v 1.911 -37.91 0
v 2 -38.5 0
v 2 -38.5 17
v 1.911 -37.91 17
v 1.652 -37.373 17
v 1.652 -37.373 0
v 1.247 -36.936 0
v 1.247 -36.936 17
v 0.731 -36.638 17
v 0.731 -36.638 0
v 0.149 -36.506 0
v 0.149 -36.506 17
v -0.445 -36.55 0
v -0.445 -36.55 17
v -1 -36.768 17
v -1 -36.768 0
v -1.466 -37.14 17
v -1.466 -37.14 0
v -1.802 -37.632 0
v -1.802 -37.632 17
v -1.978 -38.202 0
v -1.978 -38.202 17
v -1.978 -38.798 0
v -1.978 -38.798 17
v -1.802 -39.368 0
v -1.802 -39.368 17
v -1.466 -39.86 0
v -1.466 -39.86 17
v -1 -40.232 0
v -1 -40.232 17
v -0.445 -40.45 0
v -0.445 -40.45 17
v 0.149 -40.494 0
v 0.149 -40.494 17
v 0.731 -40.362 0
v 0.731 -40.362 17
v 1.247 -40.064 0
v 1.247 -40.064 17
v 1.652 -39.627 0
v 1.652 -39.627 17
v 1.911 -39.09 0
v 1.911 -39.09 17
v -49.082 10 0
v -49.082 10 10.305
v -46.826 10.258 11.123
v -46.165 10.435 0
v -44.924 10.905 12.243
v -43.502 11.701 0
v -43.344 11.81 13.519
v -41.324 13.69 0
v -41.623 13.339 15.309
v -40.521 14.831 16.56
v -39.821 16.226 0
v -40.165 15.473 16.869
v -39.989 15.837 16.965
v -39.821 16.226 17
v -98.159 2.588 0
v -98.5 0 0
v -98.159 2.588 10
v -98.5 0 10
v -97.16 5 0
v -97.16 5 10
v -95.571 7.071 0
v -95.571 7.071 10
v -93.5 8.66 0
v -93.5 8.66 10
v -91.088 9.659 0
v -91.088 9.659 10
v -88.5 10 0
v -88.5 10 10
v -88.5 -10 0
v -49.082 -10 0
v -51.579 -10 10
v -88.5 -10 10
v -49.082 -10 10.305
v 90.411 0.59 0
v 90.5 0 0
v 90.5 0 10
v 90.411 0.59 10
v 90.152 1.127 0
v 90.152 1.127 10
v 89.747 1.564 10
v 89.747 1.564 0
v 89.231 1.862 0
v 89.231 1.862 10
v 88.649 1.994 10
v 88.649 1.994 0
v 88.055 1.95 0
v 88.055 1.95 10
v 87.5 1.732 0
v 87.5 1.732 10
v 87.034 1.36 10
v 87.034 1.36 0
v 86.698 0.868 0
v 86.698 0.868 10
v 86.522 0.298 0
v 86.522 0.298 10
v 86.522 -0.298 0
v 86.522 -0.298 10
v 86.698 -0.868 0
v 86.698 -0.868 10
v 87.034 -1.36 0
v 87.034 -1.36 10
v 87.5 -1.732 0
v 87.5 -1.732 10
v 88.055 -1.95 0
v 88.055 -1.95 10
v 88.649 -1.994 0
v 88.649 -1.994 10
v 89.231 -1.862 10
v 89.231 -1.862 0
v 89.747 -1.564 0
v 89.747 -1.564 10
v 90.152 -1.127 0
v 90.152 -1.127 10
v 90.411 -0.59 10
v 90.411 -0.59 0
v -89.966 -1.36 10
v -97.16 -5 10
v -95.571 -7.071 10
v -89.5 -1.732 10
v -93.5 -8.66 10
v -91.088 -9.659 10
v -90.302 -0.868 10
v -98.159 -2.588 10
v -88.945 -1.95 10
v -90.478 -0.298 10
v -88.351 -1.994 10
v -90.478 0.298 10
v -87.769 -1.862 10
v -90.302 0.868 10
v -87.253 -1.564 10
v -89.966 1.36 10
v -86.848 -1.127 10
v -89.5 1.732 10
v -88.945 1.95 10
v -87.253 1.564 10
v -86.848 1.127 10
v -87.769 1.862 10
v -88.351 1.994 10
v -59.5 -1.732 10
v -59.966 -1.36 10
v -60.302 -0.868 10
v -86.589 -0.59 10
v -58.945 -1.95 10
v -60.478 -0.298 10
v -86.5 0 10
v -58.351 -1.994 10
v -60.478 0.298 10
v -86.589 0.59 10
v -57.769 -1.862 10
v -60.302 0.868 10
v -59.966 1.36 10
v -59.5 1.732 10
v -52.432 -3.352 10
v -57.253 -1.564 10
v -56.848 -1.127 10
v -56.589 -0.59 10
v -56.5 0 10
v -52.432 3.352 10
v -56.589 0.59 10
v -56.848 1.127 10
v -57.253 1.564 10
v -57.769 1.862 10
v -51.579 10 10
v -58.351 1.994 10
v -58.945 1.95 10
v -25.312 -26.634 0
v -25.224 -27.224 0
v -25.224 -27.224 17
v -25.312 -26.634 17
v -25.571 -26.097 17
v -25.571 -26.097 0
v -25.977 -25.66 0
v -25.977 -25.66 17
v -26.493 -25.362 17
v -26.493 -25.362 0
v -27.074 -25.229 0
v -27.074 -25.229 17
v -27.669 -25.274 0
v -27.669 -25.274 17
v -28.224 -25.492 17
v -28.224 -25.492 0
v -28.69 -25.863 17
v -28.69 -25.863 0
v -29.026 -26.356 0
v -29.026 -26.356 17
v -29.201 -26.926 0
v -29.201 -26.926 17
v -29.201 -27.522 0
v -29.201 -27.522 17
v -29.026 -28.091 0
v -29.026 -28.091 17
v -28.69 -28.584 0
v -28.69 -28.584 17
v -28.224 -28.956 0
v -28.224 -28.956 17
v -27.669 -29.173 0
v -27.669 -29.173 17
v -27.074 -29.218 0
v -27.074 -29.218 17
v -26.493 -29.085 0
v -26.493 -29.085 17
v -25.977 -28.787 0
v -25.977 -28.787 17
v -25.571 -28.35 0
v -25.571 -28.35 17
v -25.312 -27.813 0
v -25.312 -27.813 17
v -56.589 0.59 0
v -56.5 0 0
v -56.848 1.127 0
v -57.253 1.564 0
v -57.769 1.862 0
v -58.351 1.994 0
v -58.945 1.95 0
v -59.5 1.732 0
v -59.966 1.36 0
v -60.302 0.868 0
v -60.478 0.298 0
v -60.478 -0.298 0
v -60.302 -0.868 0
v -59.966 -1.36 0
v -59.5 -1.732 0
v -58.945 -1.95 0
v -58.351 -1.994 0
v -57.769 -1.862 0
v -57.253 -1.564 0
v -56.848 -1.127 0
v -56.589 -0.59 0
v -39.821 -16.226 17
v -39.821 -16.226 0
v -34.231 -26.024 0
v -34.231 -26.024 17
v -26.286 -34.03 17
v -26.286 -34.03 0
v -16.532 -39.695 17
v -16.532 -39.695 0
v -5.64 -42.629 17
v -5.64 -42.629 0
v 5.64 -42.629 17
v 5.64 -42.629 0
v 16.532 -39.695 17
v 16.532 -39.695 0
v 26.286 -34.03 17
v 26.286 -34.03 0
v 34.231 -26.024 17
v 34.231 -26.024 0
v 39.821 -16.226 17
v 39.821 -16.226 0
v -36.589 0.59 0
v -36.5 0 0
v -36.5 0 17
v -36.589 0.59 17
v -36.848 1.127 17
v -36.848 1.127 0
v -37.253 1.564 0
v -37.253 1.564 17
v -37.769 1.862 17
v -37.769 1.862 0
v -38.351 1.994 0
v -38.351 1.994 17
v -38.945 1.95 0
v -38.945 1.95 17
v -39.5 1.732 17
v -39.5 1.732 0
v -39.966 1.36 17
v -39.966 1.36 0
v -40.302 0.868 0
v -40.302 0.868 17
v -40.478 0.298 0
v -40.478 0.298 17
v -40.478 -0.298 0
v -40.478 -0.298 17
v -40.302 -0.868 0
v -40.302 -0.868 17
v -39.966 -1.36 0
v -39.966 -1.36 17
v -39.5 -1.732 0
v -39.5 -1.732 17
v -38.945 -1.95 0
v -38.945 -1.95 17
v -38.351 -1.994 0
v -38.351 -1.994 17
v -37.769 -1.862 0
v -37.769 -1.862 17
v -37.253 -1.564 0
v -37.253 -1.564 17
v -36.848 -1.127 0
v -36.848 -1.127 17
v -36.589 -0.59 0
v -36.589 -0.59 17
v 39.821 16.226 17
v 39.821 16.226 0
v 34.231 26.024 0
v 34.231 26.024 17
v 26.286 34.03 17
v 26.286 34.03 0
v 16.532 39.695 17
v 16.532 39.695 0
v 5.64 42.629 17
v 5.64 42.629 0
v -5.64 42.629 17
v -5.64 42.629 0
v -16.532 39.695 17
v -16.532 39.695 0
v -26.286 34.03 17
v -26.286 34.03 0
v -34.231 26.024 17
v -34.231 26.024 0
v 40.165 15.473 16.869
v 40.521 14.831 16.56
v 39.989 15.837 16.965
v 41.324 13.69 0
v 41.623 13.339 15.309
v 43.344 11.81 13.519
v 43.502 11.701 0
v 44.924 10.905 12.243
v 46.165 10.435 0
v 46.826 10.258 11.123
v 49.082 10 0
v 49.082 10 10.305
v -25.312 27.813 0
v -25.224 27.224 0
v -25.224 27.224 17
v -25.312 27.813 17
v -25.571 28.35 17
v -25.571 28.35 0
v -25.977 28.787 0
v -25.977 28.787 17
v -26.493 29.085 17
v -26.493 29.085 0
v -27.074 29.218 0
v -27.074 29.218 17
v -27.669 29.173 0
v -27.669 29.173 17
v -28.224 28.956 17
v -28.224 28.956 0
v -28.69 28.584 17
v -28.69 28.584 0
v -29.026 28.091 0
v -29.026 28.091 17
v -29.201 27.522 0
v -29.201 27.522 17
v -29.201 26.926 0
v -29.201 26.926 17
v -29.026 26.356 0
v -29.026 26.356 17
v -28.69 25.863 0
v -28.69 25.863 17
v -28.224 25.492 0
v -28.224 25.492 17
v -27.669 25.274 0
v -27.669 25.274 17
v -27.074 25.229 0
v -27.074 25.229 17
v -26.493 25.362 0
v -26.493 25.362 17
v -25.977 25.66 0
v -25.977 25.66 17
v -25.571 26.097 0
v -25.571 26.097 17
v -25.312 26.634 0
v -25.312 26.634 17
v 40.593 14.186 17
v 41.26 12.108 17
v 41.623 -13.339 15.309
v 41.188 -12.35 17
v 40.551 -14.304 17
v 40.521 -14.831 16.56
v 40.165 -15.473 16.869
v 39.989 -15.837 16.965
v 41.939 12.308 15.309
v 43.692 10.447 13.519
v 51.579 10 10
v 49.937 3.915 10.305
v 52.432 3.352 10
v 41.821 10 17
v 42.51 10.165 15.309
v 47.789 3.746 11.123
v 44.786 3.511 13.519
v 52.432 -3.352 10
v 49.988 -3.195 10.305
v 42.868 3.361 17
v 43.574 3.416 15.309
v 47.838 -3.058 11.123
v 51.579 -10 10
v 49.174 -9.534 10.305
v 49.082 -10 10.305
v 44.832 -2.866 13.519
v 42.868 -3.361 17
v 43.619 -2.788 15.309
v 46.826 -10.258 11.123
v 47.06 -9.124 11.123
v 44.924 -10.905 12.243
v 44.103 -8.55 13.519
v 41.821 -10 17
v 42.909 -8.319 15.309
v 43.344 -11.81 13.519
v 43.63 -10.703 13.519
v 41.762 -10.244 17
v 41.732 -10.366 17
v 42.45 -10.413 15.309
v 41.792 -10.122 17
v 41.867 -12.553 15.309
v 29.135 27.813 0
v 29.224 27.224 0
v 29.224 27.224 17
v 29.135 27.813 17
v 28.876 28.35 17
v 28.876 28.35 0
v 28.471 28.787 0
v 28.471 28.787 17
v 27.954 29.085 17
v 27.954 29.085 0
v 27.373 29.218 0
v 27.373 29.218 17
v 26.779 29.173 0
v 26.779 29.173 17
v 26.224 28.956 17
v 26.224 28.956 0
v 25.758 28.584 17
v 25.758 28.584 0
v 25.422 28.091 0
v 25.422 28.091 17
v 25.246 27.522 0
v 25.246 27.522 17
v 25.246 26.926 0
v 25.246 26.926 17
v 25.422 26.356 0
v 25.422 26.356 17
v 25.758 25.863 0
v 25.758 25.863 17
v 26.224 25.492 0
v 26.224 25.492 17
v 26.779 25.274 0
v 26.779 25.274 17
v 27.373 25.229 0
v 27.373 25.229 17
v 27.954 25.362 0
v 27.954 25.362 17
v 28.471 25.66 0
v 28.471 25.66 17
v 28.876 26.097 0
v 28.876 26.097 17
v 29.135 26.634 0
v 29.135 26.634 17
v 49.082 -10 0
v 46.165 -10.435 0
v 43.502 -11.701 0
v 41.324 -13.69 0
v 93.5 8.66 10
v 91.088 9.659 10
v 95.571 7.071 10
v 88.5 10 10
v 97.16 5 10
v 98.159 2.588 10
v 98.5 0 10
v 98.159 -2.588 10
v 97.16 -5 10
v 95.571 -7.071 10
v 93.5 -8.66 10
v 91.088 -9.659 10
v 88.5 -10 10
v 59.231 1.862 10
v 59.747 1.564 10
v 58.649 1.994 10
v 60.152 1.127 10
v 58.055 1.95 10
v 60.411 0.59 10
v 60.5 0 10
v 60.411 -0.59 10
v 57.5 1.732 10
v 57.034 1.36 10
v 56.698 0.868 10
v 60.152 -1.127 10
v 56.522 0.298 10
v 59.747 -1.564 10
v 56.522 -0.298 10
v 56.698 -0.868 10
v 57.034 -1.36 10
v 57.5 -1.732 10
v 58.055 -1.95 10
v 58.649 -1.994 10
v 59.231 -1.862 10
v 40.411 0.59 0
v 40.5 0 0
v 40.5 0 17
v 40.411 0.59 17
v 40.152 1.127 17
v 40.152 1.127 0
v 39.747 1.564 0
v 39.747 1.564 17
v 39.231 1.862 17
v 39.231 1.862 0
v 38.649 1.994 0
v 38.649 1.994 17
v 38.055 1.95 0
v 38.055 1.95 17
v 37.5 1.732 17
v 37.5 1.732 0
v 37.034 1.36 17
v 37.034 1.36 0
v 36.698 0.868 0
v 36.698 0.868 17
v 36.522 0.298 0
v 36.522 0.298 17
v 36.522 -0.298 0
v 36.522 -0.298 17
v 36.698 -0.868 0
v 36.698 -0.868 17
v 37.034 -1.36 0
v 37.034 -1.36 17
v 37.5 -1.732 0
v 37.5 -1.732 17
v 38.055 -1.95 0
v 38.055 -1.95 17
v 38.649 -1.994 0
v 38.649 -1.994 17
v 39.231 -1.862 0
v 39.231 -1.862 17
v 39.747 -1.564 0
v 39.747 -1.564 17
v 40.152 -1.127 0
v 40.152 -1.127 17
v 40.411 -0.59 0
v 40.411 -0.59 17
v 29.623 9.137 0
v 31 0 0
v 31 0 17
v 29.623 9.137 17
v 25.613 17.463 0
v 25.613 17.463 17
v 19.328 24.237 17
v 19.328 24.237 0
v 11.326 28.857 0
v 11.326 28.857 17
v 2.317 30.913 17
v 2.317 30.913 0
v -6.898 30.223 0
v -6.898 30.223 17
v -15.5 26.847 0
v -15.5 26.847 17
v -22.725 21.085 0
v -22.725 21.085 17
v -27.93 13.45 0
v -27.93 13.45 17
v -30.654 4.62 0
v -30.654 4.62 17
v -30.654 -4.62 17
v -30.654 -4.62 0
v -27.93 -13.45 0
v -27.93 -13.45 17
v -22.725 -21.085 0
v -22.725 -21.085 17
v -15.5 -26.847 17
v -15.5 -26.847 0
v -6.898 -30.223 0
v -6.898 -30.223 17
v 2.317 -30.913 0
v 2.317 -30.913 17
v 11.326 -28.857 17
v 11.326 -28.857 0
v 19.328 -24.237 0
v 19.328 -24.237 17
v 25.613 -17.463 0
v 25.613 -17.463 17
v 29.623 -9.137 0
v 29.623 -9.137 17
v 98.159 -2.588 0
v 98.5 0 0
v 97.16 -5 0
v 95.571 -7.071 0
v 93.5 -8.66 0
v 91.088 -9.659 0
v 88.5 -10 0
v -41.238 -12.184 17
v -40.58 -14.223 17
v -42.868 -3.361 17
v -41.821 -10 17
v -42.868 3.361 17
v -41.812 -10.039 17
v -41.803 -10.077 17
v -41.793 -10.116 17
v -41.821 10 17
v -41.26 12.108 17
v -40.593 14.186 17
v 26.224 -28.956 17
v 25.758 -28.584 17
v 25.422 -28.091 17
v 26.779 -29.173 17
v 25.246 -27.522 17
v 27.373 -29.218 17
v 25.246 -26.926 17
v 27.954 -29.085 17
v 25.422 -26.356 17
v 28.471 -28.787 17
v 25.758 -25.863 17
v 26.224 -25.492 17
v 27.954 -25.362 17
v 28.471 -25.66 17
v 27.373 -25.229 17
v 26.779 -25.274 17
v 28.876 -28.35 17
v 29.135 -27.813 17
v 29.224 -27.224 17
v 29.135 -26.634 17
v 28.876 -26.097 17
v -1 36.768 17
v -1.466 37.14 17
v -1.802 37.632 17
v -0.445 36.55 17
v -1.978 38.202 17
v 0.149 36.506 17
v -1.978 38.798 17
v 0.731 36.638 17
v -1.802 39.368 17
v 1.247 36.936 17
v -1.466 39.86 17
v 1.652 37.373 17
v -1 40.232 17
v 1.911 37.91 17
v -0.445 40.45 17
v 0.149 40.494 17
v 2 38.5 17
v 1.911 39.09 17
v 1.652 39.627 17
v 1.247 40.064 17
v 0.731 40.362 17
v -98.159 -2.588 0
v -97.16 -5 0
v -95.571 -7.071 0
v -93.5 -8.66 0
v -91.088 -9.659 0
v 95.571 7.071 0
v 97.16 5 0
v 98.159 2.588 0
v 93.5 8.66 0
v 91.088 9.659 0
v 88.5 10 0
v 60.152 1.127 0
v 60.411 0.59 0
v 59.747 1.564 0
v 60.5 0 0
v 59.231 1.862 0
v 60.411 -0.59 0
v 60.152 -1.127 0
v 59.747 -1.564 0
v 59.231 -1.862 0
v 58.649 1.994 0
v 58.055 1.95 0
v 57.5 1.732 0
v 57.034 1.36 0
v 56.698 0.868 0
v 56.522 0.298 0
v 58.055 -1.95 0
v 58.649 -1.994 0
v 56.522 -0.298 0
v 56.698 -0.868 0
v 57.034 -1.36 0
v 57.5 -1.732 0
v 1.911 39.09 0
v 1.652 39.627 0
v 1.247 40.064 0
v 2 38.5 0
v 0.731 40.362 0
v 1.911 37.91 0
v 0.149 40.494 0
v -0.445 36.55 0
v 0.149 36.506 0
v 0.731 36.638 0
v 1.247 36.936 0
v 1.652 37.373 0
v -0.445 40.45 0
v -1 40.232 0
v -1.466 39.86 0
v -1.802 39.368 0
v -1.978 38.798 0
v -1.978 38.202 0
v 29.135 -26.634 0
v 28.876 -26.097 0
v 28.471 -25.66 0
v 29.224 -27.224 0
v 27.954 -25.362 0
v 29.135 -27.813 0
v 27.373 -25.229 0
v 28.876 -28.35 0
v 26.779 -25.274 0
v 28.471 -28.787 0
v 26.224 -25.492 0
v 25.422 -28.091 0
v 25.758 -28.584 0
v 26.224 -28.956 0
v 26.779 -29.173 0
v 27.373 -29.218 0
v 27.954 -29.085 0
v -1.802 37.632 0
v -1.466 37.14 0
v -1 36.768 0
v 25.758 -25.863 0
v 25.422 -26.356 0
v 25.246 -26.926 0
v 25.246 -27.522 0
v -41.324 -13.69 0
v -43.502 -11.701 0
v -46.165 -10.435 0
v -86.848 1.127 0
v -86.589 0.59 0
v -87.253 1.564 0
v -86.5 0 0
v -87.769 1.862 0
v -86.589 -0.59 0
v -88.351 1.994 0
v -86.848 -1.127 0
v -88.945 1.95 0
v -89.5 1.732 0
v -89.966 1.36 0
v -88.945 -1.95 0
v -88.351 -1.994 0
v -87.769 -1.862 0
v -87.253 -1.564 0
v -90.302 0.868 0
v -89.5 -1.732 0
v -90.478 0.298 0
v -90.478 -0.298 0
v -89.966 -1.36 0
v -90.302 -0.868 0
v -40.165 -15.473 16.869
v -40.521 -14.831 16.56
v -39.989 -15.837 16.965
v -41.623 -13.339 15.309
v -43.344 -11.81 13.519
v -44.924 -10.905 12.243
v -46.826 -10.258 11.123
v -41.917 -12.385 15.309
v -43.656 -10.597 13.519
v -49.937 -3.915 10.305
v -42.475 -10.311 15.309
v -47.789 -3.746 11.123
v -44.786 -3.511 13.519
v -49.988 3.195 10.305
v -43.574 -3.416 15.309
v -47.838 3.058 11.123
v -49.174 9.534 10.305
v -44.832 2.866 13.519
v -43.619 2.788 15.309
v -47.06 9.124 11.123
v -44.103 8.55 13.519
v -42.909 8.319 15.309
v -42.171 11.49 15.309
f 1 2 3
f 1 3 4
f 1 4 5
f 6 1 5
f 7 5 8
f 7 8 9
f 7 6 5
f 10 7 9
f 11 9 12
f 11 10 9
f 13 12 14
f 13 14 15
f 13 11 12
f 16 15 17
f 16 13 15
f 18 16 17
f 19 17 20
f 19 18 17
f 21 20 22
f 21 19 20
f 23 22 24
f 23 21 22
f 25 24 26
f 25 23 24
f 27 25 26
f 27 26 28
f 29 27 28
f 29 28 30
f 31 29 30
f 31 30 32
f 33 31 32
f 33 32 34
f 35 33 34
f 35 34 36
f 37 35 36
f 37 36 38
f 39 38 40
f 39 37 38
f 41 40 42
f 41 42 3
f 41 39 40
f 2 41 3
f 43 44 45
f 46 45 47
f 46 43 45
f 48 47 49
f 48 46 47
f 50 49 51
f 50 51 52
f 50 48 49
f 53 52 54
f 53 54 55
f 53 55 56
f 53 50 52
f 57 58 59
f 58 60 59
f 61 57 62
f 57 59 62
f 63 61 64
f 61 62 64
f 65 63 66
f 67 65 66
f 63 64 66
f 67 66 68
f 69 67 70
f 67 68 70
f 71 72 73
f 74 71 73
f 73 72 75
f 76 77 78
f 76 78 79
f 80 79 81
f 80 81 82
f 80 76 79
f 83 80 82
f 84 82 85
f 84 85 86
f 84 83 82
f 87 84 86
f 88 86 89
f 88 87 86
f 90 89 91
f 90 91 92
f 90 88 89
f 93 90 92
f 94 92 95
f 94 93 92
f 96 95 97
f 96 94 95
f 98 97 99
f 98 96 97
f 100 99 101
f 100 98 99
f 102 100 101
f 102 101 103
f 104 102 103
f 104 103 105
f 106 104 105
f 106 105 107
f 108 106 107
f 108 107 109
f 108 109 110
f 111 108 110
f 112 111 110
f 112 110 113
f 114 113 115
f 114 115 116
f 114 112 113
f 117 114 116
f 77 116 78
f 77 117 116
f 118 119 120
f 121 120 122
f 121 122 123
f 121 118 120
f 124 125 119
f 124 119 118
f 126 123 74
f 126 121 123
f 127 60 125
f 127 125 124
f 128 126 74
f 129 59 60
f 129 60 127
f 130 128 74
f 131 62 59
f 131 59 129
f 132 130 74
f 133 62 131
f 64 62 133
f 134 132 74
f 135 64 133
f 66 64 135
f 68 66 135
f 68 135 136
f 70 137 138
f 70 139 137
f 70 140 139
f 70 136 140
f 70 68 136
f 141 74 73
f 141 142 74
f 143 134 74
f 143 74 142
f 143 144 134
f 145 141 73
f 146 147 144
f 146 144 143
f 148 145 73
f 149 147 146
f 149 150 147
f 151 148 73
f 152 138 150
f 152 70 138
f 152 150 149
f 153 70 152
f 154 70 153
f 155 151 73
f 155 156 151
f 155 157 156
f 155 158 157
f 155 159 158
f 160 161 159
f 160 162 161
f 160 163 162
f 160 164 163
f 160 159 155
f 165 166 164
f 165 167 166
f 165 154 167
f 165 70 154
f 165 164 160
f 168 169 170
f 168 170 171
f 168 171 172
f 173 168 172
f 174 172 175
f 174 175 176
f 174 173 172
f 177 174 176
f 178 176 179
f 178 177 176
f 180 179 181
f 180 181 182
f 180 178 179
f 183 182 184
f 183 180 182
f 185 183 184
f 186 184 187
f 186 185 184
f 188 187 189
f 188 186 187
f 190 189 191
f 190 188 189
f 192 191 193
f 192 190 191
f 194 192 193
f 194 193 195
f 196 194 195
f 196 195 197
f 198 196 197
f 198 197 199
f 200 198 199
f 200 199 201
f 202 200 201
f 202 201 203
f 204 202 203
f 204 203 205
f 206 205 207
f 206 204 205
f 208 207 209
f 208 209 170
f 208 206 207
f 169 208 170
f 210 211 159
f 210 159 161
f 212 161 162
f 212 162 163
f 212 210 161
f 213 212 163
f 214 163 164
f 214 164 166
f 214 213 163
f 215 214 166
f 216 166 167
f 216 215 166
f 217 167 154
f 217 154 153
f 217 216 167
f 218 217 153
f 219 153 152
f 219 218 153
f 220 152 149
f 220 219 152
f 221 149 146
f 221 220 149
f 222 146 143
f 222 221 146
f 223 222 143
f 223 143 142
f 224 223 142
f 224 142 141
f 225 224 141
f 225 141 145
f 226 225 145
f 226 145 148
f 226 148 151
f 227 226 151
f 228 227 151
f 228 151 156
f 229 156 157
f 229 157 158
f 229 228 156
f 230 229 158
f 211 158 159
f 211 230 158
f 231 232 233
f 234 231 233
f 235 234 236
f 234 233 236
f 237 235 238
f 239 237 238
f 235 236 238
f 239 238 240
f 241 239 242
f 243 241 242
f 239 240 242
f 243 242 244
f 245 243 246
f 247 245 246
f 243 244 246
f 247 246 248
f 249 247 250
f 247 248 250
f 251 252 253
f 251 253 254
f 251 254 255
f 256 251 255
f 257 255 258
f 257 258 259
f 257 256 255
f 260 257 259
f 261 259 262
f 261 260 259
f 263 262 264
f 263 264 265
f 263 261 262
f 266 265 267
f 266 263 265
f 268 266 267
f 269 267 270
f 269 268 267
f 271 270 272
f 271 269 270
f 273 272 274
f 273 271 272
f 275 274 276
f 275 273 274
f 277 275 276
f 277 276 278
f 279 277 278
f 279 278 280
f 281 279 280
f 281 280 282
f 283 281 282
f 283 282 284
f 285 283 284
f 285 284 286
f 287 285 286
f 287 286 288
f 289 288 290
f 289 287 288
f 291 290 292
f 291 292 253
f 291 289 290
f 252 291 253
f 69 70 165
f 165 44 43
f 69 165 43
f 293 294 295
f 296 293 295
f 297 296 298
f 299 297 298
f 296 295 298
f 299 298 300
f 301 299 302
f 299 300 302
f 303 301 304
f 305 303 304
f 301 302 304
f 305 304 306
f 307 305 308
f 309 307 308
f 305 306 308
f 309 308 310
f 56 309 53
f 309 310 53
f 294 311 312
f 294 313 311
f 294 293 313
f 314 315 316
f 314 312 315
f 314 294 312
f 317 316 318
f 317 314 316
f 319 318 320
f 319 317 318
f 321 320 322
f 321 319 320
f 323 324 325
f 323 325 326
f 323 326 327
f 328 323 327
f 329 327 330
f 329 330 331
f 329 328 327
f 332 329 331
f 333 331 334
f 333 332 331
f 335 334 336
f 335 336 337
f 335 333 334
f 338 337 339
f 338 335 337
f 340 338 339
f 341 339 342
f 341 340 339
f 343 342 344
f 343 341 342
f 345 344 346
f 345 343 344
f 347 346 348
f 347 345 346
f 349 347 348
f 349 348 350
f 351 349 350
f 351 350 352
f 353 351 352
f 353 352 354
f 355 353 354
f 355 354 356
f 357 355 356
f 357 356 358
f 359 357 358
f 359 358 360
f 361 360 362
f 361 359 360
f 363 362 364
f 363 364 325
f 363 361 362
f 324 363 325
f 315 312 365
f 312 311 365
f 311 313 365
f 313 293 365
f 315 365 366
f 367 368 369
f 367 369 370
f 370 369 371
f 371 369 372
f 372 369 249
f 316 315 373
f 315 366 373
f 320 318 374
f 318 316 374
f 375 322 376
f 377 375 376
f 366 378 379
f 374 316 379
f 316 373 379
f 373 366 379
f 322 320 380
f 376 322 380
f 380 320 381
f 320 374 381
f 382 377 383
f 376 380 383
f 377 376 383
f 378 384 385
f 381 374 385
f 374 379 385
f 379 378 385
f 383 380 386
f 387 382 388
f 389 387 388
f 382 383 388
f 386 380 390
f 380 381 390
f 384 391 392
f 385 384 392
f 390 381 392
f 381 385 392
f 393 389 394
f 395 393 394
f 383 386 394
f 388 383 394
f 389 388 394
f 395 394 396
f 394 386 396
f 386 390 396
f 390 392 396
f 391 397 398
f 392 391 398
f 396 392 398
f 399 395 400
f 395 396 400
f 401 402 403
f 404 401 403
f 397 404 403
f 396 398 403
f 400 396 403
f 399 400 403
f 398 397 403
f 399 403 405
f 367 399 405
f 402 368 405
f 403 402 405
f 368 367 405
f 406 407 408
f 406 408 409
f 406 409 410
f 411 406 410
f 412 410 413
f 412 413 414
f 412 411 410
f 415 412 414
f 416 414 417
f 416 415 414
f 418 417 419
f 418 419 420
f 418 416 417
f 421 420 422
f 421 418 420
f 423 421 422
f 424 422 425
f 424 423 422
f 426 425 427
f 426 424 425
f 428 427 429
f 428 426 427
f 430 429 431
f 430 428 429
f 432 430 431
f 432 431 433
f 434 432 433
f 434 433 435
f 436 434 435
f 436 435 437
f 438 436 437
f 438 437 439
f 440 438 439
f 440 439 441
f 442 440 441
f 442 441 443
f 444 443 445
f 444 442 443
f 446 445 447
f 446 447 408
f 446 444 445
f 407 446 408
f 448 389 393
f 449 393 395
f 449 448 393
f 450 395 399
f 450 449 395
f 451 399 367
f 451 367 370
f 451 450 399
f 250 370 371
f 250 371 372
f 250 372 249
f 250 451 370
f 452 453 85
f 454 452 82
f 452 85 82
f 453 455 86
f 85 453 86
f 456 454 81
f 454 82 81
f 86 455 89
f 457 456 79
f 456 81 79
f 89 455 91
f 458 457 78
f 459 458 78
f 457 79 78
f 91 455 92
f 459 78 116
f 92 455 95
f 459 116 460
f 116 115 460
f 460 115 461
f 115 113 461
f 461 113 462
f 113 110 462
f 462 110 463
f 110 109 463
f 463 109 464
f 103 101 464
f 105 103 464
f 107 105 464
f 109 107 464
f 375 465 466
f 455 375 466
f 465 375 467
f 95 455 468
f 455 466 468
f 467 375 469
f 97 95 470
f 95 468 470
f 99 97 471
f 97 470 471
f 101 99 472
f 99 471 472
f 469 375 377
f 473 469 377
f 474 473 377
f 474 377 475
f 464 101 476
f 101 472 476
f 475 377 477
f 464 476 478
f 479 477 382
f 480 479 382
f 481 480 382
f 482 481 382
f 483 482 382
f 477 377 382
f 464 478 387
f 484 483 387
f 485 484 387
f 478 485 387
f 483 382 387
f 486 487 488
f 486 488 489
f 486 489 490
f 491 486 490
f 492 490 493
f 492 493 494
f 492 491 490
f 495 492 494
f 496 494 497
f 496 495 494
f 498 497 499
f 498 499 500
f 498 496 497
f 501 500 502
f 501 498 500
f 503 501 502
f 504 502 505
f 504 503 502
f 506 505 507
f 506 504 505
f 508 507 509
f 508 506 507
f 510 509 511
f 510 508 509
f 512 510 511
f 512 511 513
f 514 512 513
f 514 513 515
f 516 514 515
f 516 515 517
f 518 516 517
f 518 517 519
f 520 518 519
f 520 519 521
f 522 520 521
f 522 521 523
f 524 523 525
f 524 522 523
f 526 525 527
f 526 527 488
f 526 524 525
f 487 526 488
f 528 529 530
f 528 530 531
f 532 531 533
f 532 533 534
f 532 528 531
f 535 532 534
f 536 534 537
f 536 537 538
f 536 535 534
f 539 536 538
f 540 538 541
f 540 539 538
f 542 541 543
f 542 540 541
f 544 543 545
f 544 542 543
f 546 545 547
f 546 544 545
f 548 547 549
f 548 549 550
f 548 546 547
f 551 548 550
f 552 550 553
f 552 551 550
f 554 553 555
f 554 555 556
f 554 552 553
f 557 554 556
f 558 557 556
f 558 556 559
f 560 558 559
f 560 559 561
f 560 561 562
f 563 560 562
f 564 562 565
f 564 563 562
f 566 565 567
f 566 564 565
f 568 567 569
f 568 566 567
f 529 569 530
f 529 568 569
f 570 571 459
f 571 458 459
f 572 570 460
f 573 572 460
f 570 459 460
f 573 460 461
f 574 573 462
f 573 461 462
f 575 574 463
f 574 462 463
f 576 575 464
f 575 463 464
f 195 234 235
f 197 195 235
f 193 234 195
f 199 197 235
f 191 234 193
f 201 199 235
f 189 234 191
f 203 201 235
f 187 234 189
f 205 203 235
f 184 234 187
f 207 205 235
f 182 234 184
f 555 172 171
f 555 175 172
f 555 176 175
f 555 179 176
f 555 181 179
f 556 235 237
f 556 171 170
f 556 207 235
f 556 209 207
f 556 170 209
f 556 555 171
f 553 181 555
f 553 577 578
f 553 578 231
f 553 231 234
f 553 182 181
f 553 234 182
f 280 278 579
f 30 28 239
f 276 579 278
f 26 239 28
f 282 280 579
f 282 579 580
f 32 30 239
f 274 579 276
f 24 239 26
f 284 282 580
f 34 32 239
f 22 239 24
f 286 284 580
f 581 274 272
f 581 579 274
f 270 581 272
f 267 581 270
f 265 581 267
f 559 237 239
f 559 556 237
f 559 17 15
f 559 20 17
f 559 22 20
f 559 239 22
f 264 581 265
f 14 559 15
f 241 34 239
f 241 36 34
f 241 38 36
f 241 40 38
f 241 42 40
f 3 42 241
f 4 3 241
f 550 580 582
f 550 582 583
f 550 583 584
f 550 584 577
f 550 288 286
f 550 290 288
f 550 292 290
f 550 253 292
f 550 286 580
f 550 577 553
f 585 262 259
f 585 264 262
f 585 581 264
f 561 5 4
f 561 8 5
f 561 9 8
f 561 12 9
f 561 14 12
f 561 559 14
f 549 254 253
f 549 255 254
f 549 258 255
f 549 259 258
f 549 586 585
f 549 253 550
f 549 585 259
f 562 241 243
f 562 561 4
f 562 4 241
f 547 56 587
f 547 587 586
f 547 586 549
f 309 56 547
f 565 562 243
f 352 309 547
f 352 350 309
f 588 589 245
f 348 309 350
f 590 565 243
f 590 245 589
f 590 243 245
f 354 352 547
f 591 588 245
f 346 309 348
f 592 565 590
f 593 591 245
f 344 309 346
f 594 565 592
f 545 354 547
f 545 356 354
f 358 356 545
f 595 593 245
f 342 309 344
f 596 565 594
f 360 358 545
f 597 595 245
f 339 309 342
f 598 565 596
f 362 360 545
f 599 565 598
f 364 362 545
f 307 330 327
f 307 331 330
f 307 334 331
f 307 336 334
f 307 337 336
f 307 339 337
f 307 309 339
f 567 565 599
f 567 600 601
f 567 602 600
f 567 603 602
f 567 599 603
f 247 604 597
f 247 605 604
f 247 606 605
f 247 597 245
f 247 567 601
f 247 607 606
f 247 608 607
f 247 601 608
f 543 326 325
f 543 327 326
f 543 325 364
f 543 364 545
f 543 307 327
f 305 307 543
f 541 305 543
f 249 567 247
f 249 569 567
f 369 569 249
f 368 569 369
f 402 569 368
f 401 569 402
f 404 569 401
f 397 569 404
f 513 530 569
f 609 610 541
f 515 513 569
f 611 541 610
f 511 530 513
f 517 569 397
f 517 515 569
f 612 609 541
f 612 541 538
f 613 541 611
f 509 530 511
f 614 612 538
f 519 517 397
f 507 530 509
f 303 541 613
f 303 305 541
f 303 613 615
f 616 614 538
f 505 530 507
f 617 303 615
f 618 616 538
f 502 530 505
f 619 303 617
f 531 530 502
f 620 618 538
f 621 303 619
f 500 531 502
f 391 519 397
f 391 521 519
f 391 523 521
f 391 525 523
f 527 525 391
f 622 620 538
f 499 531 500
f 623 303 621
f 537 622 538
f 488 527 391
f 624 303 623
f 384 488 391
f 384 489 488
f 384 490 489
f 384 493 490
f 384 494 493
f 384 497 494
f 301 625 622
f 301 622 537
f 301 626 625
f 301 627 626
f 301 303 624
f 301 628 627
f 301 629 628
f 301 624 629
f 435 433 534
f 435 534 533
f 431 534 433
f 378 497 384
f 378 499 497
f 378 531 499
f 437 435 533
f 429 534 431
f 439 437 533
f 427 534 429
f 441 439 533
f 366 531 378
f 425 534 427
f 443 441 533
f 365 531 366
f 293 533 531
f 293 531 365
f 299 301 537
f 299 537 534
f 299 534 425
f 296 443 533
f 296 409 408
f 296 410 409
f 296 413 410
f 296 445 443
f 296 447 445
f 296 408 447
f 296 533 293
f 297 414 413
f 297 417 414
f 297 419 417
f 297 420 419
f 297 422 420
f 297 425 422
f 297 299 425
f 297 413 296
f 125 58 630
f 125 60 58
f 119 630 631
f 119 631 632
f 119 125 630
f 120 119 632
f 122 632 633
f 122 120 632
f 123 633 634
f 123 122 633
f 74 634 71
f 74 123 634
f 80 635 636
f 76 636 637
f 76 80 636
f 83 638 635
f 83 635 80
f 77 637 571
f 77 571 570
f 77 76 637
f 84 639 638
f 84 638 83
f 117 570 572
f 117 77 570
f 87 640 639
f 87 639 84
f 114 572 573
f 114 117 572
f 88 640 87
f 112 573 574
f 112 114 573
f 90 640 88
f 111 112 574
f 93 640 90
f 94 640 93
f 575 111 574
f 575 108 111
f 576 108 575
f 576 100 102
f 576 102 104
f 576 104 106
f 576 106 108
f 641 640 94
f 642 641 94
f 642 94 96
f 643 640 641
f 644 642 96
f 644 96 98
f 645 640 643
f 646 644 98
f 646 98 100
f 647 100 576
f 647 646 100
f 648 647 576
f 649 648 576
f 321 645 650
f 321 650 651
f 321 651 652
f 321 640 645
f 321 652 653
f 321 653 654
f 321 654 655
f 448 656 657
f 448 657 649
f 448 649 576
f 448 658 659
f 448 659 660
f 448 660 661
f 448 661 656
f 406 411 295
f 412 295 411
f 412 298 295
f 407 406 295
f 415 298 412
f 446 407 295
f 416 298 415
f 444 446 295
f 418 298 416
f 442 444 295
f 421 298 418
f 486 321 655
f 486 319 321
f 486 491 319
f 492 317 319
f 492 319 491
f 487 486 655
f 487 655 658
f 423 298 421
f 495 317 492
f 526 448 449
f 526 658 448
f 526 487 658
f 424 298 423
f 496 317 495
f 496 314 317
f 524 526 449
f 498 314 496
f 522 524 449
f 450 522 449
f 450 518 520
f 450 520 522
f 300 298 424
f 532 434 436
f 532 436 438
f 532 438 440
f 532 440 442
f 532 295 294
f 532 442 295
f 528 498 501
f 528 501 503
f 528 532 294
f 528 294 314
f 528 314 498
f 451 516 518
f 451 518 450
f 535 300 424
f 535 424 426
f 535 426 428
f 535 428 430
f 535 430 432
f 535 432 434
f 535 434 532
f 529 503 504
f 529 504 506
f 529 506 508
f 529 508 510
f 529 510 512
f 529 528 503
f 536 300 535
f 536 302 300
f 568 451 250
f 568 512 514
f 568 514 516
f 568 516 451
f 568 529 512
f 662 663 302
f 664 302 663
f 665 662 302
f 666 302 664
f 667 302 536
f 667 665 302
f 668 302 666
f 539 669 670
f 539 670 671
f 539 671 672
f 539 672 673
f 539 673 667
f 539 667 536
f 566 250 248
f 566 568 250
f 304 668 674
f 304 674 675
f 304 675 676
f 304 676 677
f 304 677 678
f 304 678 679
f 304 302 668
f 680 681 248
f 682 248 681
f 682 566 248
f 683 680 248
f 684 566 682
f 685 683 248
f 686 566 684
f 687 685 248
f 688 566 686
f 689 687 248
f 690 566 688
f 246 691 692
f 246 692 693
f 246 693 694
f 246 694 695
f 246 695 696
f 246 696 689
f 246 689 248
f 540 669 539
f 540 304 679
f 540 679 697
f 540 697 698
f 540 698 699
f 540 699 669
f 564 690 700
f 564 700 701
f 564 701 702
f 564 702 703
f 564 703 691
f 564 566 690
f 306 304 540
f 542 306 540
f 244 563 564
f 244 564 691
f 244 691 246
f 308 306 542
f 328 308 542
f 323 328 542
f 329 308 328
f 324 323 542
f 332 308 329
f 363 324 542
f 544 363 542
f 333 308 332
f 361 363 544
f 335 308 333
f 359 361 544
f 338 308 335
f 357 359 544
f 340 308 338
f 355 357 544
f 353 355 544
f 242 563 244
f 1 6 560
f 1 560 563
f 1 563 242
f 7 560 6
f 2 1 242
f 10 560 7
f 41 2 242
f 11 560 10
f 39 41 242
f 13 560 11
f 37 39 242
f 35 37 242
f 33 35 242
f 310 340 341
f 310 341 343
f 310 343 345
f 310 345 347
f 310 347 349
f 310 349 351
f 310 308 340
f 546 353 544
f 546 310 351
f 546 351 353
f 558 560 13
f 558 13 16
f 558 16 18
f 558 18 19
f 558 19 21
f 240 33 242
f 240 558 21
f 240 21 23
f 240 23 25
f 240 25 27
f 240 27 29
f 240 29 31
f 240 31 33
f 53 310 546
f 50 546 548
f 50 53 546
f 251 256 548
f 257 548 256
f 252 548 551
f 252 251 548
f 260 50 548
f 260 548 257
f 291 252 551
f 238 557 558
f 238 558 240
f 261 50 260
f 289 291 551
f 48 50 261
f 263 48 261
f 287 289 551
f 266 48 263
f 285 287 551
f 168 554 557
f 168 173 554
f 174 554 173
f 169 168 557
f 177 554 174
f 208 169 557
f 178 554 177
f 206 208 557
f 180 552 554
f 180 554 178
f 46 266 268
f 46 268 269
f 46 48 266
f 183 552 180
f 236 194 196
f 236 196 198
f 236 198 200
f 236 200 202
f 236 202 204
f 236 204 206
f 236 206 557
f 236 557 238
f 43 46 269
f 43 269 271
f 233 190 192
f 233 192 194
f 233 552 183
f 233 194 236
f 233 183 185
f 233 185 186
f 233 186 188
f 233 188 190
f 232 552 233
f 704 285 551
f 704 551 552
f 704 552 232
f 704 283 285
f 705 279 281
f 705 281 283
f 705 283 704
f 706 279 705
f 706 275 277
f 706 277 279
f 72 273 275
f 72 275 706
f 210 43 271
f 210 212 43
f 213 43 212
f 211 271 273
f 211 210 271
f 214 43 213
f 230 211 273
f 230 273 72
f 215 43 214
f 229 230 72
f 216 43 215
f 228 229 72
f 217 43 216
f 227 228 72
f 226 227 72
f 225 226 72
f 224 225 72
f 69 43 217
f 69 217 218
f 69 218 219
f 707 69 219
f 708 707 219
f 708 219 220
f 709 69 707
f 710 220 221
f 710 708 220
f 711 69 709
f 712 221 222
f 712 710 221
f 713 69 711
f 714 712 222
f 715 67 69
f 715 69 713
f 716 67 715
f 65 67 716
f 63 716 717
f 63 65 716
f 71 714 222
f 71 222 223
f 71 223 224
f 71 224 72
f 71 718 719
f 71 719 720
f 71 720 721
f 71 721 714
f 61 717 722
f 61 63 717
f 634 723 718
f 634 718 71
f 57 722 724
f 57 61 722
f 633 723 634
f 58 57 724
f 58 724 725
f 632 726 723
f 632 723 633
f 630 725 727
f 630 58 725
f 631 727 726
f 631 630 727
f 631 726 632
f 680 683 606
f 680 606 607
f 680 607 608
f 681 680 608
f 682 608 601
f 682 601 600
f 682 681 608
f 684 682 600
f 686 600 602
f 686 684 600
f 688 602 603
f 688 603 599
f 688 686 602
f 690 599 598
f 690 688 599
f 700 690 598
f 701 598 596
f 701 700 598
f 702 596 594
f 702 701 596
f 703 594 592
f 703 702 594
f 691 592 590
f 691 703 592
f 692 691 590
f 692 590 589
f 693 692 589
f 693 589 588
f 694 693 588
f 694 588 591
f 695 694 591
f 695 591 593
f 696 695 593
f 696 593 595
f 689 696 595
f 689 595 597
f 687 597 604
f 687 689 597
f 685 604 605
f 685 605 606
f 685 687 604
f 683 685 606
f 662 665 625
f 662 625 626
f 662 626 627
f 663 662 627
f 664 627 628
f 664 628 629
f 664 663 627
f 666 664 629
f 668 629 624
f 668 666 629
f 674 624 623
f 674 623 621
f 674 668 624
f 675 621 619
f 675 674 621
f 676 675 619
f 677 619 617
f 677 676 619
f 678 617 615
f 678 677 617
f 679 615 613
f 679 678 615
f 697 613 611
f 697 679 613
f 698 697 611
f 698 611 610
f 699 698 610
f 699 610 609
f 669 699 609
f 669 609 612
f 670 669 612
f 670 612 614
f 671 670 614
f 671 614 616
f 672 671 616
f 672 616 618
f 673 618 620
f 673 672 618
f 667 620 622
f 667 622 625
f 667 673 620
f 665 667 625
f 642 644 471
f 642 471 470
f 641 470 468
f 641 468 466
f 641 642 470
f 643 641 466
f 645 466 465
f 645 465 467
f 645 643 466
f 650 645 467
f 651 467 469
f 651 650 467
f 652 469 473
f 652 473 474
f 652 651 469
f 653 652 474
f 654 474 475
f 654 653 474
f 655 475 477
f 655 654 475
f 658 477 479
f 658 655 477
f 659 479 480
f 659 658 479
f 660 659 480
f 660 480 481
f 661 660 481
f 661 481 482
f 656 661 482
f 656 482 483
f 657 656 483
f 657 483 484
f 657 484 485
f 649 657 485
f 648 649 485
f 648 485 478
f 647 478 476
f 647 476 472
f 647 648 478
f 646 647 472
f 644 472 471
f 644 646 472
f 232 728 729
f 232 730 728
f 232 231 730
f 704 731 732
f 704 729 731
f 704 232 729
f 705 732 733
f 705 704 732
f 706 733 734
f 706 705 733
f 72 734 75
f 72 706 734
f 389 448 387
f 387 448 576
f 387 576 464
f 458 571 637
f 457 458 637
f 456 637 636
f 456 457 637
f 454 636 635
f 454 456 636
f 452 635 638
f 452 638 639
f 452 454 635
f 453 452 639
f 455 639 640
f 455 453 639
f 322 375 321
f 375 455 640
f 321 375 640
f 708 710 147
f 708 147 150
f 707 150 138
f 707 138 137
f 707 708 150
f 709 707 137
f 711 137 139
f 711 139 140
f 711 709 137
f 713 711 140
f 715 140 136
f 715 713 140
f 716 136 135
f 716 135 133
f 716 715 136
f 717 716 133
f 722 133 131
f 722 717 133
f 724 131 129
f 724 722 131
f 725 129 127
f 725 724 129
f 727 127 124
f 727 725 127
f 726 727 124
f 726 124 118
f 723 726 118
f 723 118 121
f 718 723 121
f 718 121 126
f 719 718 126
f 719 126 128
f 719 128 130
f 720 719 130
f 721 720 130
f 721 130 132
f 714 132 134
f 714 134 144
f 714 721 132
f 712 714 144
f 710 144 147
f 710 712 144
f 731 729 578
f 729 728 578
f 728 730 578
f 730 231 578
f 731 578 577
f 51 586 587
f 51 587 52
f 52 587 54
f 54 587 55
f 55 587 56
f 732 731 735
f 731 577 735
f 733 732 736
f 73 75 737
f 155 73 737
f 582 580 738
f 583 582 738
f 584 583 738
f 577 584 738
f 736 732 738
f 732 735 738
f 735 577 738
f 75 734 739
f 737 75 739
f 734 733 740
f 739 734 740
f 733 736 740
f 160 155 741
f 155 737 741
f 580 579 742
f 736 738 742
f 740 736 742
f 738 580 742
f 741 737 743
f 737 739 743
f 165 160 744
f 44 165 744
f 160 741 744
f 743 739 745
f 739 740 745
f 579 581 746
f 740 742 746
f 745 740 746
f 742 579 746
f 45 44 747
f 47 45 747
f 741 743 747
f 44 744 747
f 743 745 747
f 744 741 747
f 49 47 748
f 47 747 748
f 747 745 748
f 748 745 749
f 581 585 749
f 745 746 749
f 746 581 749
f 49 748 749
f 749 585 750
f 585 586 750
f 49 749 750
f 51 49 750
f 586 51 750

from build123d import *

# Parameters (mm, degrees)
SKETCH1_R           = 2
SKETCH1_R_2         = 31
BOSS_EXTRUDE1_DEPTH = 17
SKETCH1_3_R         = 2
BOSS_EXTRUDE2_DEPTH = 10
FILLET1_R           = 10
FILLET2_R           = 10


# Some blends are built 0.0001 mm under size
with BuildPart() as part:
    # Sketch1 → Boss-Extrude1 (new body)
    with BuildSketch(Plane.XY):
        with BuildLine():
            ThreePointArc((41.821047333, 10), (0, 43), (-41.821047333, 10))
            ThreePointArc((-41.821047333, 10), (-43, 0), (-41.821047333, -10))
            ThreePointArc((-41.821047333, -10), (-41.80718648, -10.057790941), (-41.793245769, -10.11556267))
            ThreePointArc((-41.793245769, -10.11556267), (-0.129174326, -42.999805976), (41.731716335, -10.366477306))
            ThreePointArc((41.731716335, -10.366477306), (41.776783691, -10.183336608), (41.821047333, -10))
            ThreePointArc((41.821047333, -10), (43, 0), (41.821047333, 10))
        make_face()
        with Locations((-27.223611076, -27.223611076)):
            Circle(SKETCH1_R, mode=Mode.SUBTRACT)
        with Locations((0, -38.5)):
            Circle(SKETCH1_R, mode=Mode.SUBTRACT)
        with Locations((27.223611076, -27.223611076)):
            Circle(SKETCH1_R, mode=Mode.SUBTRACT)
        with Locations((-38.5, 0)):
            Circle(SKETCH1_R, mode=Mode.SUBTRACT)
        with Locations((-27.223611076, 27.223611076)):
            Circle(SKETCH1_R, mode=Mode.SUBTRACT)
        Circle(SKETCH1_R_2, mode=Mode.SUBTRACT)
        with Locations((38.5, 0)):
            Circle(SKETCH1_R, mode=Mode.SUBTRACT)
        with Locations((27.223611076, 27.223611076)):
            Circle(SKETCH1_R, mode=Mode.SUBTRACT)
        with Locations((0, 38.5)):
            Circle(SKETCH1_R, mode=Mode.SUBTRACT)
    extrude(amount=BOSS_EXTRUDE1_DEPTH)

    # Sketch1<3> → Boss-Extrude2 (add)
    # profile 1 of 2: a face of its own
    with BuildSketch(Plane.XY):
        with BuildLine():
            ThreePointArc((-41.821047333, -10), (-43, 0), (-41.821047333, 10))
            Line((-41.821047333, 10), (-98.5, 10))
            Line((-98.5, 10), (-98.5, -10))
            Line((-98.5, -10), (-41.821047333, -10))
        make_face()
        with Locations((-88.5, 0)):
            Circle(SKETCH1_3_R, mode=Mode.SUBTRACT)
        with Locations((-58.5, 0)):
            Circle(SKETCH1_3_R, mode=Mode.SUBTRACT)
    # profile 2 of 2: a face of its own
    with BuildSketch(Plane.XY):
        with BuildLine():
            Line((98.5, 10), (41.821047333, 10))
            ThreePointArc((41.821047333, 10), (43, 0), (41.821047333, -10))
            Line((41.821047333, -10), (98.5, -10))
            Line((98.5, -10), (98.5, 10))
        make_face()
        with Locations((58.5, 0)):
            Circle(SKETCH1_3_R, mode=Mode.SUBTRACT)
        with Locations((88.5, 0)):
            Circle(SKETCH1_3_R, mode=Mode.SUBTRACT)
    extrude(amount=BOSS_EXTRUDE2_DEPTH)

    # Fillet1
    # the kernel refuses this fillet: 10 mm, written as the material it adds along each edge
    with BuildSketch(Plane(origin=(0, 0, 10), x_dir=(-0.7043119936118605, -0.7098905659709015, 0), z_dir=(0.7098905659709015, -0.7043119936118605, 0))) as fillet1_piece_1_section:
        with BuildLine():
            CenterArc((52.539392014, -10), FILLET1_R, 90, 72.542396876)
            Line((52.539392014, 0), (52.539392014, 0.2))
            Line((52.539392014, 0.2), (43, 0.2))
            Line((43, 0.2), (42.8, 0))
            ThreePointArc((42.8, 0), (42.8, -3.5), (42.80921216, -6.94))
            Line((42.80921216, -6.94), (43, -7))
        make_face()
    fillet1_piece_1 = revolve(axis=Axis((0, 0, 10), (0, 0, -1)), revolution_arc=90.452024347, mode=Mode.PRIVATE)
    fillet1_piece_1 = split(fillet1_piece_1, bisect_by=Plane(origin=(-44.895509483, 10, 11.788543671), z_dir=(0, -1, 0)), keep=Keep.TOP, mode=Mode.PRIVATE)
    fillet1_piece_1 = split(fillet1_piece_1, bisect_by=Plane(origin=(-44.895509483, -10, 11.788543671), z_dir=(0, 1, 0)), keep=Keep.TOP, mode=Mode.PRIVATE)
    add(fillet1_piece_1)
    with BuildSketch(Plane(origin=(-41.821047333, -10, 0), x_dir=(0.30584389927154154, -0.952081671537888, 0), z_dir=(0, 0, 1)), Plane(origin=(41.821047333, 10, 0), x_dir=(-0.30584389927146016, 0.9520816715379143, 0), z_dir=(0, 0, 1))) as fillet1_piece_2:
        with BuildLine():
            CenterArc((7.300231752, -9.971044568), FILLET1_R, 94.36121506, 67.829842836)
            Line((-2.220584963, -6.912605575), (-2.411001297, -6.851436795))
            Line((-2.411001297, -6.851436795), (-0.190416334, 0.06116878))
            Line((-0.190416334, 0.06116878), (0.015208816, 0.199420891))
            ThreePointArc((0.015208816, 0.199420891), (3.269895472, 0.075491643), (6.524582129, 0.199420891))
            Line((6.524582129, 0.199420891), (6.539790945, 0))
        make_face()
    extrude(amount=10)
    with BuildSketch(Plane(origin=(-41.821047333, 10, 0), x_dir=(0.3058438992715413, 0.9520816715378883, 0), z_dir=(0, 0, 1)), Plane(origin=(41.821047333, -10, 0), x_dir=(-0.30584389927145916, -0.9520816715379147, 0), z_dir=(0, 0, 1))) as fillet1_piece_3:
        with BuildLine():
            CenterArc((7.300231752, 9.971044568), FILLET1_R, 197.808942104, 67.829842836)
            Line((-2.220584963, 6.912605575), (-2.411001297, 6.851436795))
            Line((-2.411001297, 6.851436795), (-0.190416334, -0.06116878))
            Line((-0.190416334, -0.06116878), (0.015208816, -0.199420891))
            ThreePointArc((0.015208816, -0.199420891), (3.269895472, -0.075491643), (6.524582129, -0.199420891))
            Line((6.524582129, -0.199420891), (6.539790945, 0))
        make_face()
    extrude(amount=10)
    with BuildSketch(Plane(origin=(0, 0, 10), x_dir=(0.7043119936118566, 0.709890565970905, 0), z_dir=(-0.709890565970905, 0.7043119936118566, 0))) as fillet1_piece_4_section:
        with BuildLine():
            CenterArc((52.539392014, -10), FILLET1_R, 90, 72.542396876)
            Line((52.539392014, 0), (52.539392014, 0.2))
            Line((52.539392014, 0.2), (43, 0.2))
            Line((43, 0.2), (42.8, 0))
            ThreePointArc((42.8, 0), (42.8, -3.5), (42.80921216, -6.94))
            Line((42.80921216, -6.94), (43, -7))
        make_face()
    fillet1_piece_4 = revolve(axis=Axis((0, 0, 10), (0, 0, -1)), revolution_arc=90.452024347, mode=Mode.PRIVATE)
    fillet1_piece_4 = split(fillet1_piece_4, bisect_by=Plane(origin=(44.895509483, -10, 11.788543671), z_dir=(0, 1, 0)), keep=Keep.TOP, mode=Mode.PRIVATE)
    fillet1_piece_4 = split(fillet1_piece_4, bisect_by=Plane(origin=(44.895509483, 10, 11.788543671), z_dir=(0, -1, 0)), keep=Keep.TOP, mode=Mode.PRIVATE)
    add(fillet1_piece_4)
    with BuildSketch(Plane(origin=(0, 0, 10), x_dir=(-0.7043119936118605, -0.7098905659709015, 0), z_dir=(0.7098905659709015, -0.7043119936118605, 0))) as fillet1_piece_5a_section:
        with BuildLine():
            CenterArc((52.539392014, -10), FILLET1_R, 90, 72.542396876)
            Line((52.539392014, 0), (52.539392014, 0.2))
            Line((52.539392014, 0.2), (43, 0.2))
            Line((43, 0.2), (42.8, 0))
            ThreePointArc((42.8, 0), (42.8, -3.5), (42.80921216, -6.94))
            Line((42.80921216, -6.94), (43, -7))
        make_face()
    fillet1_piece_5a = revolve(axis=Axis((0, 0, 10), (0, 0, -1)), revolution_arc=90.452024347, mode=Mode.PRIVATE)
    fillet1_piece_5a = split(fillet1_piece_5a, bisect_by=Plane(origin=(-39.191113565, -10, 11.725292832), z_dir=(0, -1, 0)), keep=Keep.TOP, mode=Mode.PRIVATE)
    with BuildSketch(Plane(origin=(-41.821047333, -10, 0), x_dir=(0.30584389927154154, -0.952081671537888, 0), z_dir=(0, 0, 1))) as fillet1_piece_5b_section:
        with BuildLine():
            CenterArc((7.300231752, -9.971044568), FILLET1_R, 94.36121506, 67.829842836)
            Line((-2.220584963, -6.912605575), (-2.411001297, -6.851436795))
            Line((-2.411001297, -6.851436795), (-0.190416334, 0.06116878))
            Line((-0.190416334, 0.06116878), (0.015208816, 0.199420891))
            ThreePointArc((0.015208816, 0.199420891), (3.269895472, 0.075491643), (6.524582129, 0.199420891))
            Line((6.524582129, 0.199420891), (6.539790945, 0))
        make_face()
    fillet1_piece_5b = extrude(amount=28.151293586, mode=Mode.PRIVATE)
    fillet1_piece_5b = split(fillet1_piece_5b, bisect_by=Plane(origin=(-43.086853449, -11.367069141, 17), z_dir=(0, 0, -1)), keep=Keep.TOP, mode=Mode.PRIVATE)
    fillet1_piece_5b = split(fillet1_piece_5b, bisect_by=Plane(origin=(-43.086853449, -11.367069141, 10), z_dir=(0, 0, 1)), keep=Keep.TOP, mode=Mode.PRIVATE)
    fillet1_piece_5 = fillet1_piece_5a & fillet1_piece_5b
    add(fillet1_piece_5)
    with BuildSketch(Plane(origin=(-41.821047333, 10, 0), x_dir=(0.3058438992715413, 0.9520816715378883, 0), z_dir=(0, 0, 1))) as fillet1_piece_6a_section:
        with BuildLine():
            CenterArc((7.300231752, 9.971044568), FILLET1_R, 197.808942104, 67.829842836)
            Line((-2.220584963, 6.912605575), (-2.411001297, 6.851436795))
            Line((-2.411001297, 6.851436795), (-0.190416334, -0.06116878))
            Line((-0.190416334, -0.06116878), (0.015208816, -0.199420891))
            ThreePointArc((0.015208816, -0.199420891), (3.269895472, -0.075491643), (6.524582129, -0.199420891))
            Line((6.524582129, -0.199420891), (6.539790945, 0))
        make_face()
    fillet1_piece_6a = extrude(amount=28.151293586, mode=Mode.PRIVATE)
    fillet1_piece_6a = split(fillet1_piece_6a, bisect_by=Plane(origin=(-43.086853449, 11.367069141, 17), z_dir=(0, 0, -1)), keep=Keep.TOP, mode=Mode.PRIVATE)
    fillet1_piece_6a = split(fillet1_piece_6a, bisect_by=Plane(origin=(-43.086853449, 11.367069141, 10), z_dir=(0, 0, 1)), keep=Keep.TOP, mode=Mode.PRIVATE)
    with BuildSketch(Plane(origin=(0, 0, 10), x_dir=(-0.7043119936118605, -0.7098905659709015, 0), z_dir=(0.7098905659709015, -0.7043119936118605, 0))) as fillet1_piece_6b_section:
        with BuildLine():
            CenterArc((52.539392014, -10), FILLET1_R, 90, 72.542396876)
            Line((52.539392014, 0), (52.539392014, 0.2))
            Line((52.539392014, 0.2), (43, 0.2))
            Line((43, 0.2), (42.8, 0))
            ThreePointArc((42.8, 0), (42.8, -3.5), (42.80921216, -6.94))
            Line((42.80921216, -6.94), (43, -7))
        make_face()
    fillet1_piece_6b = revolve(axis=Axis((0, 0, 10), (0, 0, -1)), revolution_arc=90.452024347, mode=Mode.PRIVATE)
    fillet1_piece_6b = split(fillet1_piece_6b, bisect_by=Plane(origin=(-39.191113142, 10, 11.725292885), z_dir=(0, 1, 0)), keep=Keep.TOP, mode=Mode.PRIVATE)
    fillet1_piece_6 = fillet1_piece_6a & fillet1_piece_6b
    add(fillet1_piece_6)
    with BuildSketch(Plane(origin=(0, 0, 10), x_dir=(0.7043119936118566, 0.709890565970905, 0), z_dir=(-0.709890565970905, 0.7043119936118566, 0))) as fillet1_piece_7a_section:
        with BuildLine():
            CenterArc((52.539392014, -10), FILLET1_R, 90, 72.542396876)
            Line((52.539392014, 0), (52.539392014, 0.2))
            Line((52.539392014, 0.2), (43, 0.2))
            Line((43, 0.2), (42.8, 0))
            ThreePointArc((42.8, 0), (42.8, -3.5), (42.80921216, -6.94))
            Line((42.80921216, -6.94), (43, -7))
        make_face()
    fillet1_piece_7a = revolve(axis=Axis((0, 0, 10), (0, 0, -1)), revolution_arc=90.452024347, mode=Mode.PRIVATE)
    fillet1_piece_7a = split(fillet1_piece_7a, bisect_by=Plane(origin=(39.191113565, 10, 11.725292832), z_dir=(0, 1, 0)), keep=Keep.TOP, mode=Mode.PRIVATE)
    with BuildSketch(Plane(origin=(41.821047333, 10, 0), x_dir=(-0.30584389927146016, 0.9520816715379143, 0), z_dir=(0, 0, 1))) as fillet1_piece_7b_section:
        with BuildLine():
            CenterArc((7.300231752, -9.971044568), FILLET1_R, 94.36121506, 67.829842836)
            Line((-2.220584963, -6.912605575), (-2.411001297, -6.851436795))
            Line((-2.411001297, -6.851436795), (-0.190416334, 0.06116878))
            Line((-0.190416334, 0.06116878), (0.015208816, 0.199420891))
            ThreePointArc((0.015208816, 0.199420891), (3.269895472, 0.075491643), (6.524582129, 0.199420891))
            Line((6.524582129, 0.199420891), (6.539790945, 0))
        make_face()
    fillet1_piece_7b = extrude(amount=28.151293586, mode=Mode.PRIVATE)
    fillet1_piece_7b = split(fillet1_piece_7b, bisect_by=Plane(origin=(43.086853449, 11.367069141, 17), z_dir=(0, 0, -1)), keep=Keep.TOP, mode=Mode.PRIVATE)
    fillet1_piece_7b = split(fillet1_piece_7b, bisect_by=Plane(origin=(43.086853449, 11.367069141, 10), z_dir=(0, 0, 1)), keep=Keep.TOP, mode=Mode.PRIVATE)
    fillet1_piece_7 = fillet1_piece_7a & fillet1_piece_7b
    add(fillet1_piece_7)
    with BuildSketch(Plane(origin=(41.821047333, -10, 0), x_dir=(-0.30584389927145916, -0.9520816715379147, 0), z_dir=(0, 0, 1))) as fillet1_piece_8a_section:
        with BuildLine():
            CenterArc((7.300231752, 9.971044568), FILLET1_R, 197.808942104, 67.829842836)
            Line((-2.220584963, 6.912605575), (-2.411001297, 6.851436795))
            Line((-2.411001297, 6.851436795), (-0.190416334, -0.06116878))
            Line((-0.190416334, -0.06116878), (0.015208816, -0.199420891))
            ThreePointArc((0.015208816, -0.199420891), (3.269895472, -0.075491643), (6.524582129, -0.199420891))
            Line((6.524582129, -0.199420891), (6.539790945, 0))
        make_face()
    fillet1_piece_8a = extrude(amount=28.151293586, mode=Mode.PRIVATE)
    fillet1_piece_8a = split(fillet1_piece_8a, bisect_by=Plane(origin=(43.086853449, -11.367069141, 17), z_dir=(0, 0, -1)), keep=Keep.TOP, mode=Mode.PRIVATE)
    fillet1_piece_8a = split(fillet1_piece_8a, bisect_by=Plane(origin=(43.086853449, -11.367069141, 10), z_dir=(0, 0, 1)), keep=Keep.TOP, mode=Mode.PRIVATE)
    with BuildSketch(Plane(origin=(0, 0, 10), x_dir=(0.7043119936118566, 0.709890565970905, 0), z_dir=(-0.709890565970905, 0.7043119936118566, 0))) as fillet1_piece_8b_section:
        with BuildLine():
            CenterArc((52.539392014, -10), FILLET1_R, 90, 72.542396876)
            Line((52.539392014, 0), (52.539392014, 0.2))
            Line((52.539392014, 0.2), (43, 0.2))
            Line((43, 0.2), (42.8, 0))
            ThreePointArc((42.8, 0), (42.8, -3.5), (42.80921216, -6.94))
            Line((42.80921216, -6.94), (43, -7))
        make_face()
    fillet1_piece_8b = revolve(axis=Axis((0, 0, 10), (0, 0, -1)), revolution_arc=90.452024347, mode=Mode.PRIVATE)
    fillet1_piece_8b = split(fillet1_piece_8b, bisect_by=Plane(origin=(39.191113142, -10, 11.725292885), z_dir=(0, -1, 0)), keep=Keep.TOP, mode=Mode.PRIVATE)
    fillet1_piece_8 = fillet1_piece_8a & fillet1_piece_8b
    add(fillet1_piece_8)

    # Fillet2
    fillet2_edges = [part.edges().sort_by_distance(p)[0] for p in [
        (98.5, -10, 5),
        (98.5, 10, 5),
        (-98.5, -10, 5),
        (-98.5, 10, 5),
    ]]
    fillet(fillet2_edges, radius=FILLET2_R - 0.0001)  # a hair under: the kernel refuses the full size


solid = part.part
